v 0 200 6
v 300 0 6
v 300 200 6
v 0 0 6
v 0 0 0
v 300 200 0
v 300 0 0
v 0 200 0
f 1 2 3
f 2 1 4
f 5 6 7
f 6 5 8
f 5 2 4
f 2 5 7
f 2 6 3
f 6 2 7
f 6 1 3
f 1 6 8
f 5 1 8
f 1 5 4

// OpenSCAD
$fn = 64;

// Aluminium tooling plate (sheet)
length = 300;   // mm
width  = 200;   // mm
thick  = 6;     // mm

color([0.75, 0.78, 0.82])
cube([length, width, thick], center=false);
